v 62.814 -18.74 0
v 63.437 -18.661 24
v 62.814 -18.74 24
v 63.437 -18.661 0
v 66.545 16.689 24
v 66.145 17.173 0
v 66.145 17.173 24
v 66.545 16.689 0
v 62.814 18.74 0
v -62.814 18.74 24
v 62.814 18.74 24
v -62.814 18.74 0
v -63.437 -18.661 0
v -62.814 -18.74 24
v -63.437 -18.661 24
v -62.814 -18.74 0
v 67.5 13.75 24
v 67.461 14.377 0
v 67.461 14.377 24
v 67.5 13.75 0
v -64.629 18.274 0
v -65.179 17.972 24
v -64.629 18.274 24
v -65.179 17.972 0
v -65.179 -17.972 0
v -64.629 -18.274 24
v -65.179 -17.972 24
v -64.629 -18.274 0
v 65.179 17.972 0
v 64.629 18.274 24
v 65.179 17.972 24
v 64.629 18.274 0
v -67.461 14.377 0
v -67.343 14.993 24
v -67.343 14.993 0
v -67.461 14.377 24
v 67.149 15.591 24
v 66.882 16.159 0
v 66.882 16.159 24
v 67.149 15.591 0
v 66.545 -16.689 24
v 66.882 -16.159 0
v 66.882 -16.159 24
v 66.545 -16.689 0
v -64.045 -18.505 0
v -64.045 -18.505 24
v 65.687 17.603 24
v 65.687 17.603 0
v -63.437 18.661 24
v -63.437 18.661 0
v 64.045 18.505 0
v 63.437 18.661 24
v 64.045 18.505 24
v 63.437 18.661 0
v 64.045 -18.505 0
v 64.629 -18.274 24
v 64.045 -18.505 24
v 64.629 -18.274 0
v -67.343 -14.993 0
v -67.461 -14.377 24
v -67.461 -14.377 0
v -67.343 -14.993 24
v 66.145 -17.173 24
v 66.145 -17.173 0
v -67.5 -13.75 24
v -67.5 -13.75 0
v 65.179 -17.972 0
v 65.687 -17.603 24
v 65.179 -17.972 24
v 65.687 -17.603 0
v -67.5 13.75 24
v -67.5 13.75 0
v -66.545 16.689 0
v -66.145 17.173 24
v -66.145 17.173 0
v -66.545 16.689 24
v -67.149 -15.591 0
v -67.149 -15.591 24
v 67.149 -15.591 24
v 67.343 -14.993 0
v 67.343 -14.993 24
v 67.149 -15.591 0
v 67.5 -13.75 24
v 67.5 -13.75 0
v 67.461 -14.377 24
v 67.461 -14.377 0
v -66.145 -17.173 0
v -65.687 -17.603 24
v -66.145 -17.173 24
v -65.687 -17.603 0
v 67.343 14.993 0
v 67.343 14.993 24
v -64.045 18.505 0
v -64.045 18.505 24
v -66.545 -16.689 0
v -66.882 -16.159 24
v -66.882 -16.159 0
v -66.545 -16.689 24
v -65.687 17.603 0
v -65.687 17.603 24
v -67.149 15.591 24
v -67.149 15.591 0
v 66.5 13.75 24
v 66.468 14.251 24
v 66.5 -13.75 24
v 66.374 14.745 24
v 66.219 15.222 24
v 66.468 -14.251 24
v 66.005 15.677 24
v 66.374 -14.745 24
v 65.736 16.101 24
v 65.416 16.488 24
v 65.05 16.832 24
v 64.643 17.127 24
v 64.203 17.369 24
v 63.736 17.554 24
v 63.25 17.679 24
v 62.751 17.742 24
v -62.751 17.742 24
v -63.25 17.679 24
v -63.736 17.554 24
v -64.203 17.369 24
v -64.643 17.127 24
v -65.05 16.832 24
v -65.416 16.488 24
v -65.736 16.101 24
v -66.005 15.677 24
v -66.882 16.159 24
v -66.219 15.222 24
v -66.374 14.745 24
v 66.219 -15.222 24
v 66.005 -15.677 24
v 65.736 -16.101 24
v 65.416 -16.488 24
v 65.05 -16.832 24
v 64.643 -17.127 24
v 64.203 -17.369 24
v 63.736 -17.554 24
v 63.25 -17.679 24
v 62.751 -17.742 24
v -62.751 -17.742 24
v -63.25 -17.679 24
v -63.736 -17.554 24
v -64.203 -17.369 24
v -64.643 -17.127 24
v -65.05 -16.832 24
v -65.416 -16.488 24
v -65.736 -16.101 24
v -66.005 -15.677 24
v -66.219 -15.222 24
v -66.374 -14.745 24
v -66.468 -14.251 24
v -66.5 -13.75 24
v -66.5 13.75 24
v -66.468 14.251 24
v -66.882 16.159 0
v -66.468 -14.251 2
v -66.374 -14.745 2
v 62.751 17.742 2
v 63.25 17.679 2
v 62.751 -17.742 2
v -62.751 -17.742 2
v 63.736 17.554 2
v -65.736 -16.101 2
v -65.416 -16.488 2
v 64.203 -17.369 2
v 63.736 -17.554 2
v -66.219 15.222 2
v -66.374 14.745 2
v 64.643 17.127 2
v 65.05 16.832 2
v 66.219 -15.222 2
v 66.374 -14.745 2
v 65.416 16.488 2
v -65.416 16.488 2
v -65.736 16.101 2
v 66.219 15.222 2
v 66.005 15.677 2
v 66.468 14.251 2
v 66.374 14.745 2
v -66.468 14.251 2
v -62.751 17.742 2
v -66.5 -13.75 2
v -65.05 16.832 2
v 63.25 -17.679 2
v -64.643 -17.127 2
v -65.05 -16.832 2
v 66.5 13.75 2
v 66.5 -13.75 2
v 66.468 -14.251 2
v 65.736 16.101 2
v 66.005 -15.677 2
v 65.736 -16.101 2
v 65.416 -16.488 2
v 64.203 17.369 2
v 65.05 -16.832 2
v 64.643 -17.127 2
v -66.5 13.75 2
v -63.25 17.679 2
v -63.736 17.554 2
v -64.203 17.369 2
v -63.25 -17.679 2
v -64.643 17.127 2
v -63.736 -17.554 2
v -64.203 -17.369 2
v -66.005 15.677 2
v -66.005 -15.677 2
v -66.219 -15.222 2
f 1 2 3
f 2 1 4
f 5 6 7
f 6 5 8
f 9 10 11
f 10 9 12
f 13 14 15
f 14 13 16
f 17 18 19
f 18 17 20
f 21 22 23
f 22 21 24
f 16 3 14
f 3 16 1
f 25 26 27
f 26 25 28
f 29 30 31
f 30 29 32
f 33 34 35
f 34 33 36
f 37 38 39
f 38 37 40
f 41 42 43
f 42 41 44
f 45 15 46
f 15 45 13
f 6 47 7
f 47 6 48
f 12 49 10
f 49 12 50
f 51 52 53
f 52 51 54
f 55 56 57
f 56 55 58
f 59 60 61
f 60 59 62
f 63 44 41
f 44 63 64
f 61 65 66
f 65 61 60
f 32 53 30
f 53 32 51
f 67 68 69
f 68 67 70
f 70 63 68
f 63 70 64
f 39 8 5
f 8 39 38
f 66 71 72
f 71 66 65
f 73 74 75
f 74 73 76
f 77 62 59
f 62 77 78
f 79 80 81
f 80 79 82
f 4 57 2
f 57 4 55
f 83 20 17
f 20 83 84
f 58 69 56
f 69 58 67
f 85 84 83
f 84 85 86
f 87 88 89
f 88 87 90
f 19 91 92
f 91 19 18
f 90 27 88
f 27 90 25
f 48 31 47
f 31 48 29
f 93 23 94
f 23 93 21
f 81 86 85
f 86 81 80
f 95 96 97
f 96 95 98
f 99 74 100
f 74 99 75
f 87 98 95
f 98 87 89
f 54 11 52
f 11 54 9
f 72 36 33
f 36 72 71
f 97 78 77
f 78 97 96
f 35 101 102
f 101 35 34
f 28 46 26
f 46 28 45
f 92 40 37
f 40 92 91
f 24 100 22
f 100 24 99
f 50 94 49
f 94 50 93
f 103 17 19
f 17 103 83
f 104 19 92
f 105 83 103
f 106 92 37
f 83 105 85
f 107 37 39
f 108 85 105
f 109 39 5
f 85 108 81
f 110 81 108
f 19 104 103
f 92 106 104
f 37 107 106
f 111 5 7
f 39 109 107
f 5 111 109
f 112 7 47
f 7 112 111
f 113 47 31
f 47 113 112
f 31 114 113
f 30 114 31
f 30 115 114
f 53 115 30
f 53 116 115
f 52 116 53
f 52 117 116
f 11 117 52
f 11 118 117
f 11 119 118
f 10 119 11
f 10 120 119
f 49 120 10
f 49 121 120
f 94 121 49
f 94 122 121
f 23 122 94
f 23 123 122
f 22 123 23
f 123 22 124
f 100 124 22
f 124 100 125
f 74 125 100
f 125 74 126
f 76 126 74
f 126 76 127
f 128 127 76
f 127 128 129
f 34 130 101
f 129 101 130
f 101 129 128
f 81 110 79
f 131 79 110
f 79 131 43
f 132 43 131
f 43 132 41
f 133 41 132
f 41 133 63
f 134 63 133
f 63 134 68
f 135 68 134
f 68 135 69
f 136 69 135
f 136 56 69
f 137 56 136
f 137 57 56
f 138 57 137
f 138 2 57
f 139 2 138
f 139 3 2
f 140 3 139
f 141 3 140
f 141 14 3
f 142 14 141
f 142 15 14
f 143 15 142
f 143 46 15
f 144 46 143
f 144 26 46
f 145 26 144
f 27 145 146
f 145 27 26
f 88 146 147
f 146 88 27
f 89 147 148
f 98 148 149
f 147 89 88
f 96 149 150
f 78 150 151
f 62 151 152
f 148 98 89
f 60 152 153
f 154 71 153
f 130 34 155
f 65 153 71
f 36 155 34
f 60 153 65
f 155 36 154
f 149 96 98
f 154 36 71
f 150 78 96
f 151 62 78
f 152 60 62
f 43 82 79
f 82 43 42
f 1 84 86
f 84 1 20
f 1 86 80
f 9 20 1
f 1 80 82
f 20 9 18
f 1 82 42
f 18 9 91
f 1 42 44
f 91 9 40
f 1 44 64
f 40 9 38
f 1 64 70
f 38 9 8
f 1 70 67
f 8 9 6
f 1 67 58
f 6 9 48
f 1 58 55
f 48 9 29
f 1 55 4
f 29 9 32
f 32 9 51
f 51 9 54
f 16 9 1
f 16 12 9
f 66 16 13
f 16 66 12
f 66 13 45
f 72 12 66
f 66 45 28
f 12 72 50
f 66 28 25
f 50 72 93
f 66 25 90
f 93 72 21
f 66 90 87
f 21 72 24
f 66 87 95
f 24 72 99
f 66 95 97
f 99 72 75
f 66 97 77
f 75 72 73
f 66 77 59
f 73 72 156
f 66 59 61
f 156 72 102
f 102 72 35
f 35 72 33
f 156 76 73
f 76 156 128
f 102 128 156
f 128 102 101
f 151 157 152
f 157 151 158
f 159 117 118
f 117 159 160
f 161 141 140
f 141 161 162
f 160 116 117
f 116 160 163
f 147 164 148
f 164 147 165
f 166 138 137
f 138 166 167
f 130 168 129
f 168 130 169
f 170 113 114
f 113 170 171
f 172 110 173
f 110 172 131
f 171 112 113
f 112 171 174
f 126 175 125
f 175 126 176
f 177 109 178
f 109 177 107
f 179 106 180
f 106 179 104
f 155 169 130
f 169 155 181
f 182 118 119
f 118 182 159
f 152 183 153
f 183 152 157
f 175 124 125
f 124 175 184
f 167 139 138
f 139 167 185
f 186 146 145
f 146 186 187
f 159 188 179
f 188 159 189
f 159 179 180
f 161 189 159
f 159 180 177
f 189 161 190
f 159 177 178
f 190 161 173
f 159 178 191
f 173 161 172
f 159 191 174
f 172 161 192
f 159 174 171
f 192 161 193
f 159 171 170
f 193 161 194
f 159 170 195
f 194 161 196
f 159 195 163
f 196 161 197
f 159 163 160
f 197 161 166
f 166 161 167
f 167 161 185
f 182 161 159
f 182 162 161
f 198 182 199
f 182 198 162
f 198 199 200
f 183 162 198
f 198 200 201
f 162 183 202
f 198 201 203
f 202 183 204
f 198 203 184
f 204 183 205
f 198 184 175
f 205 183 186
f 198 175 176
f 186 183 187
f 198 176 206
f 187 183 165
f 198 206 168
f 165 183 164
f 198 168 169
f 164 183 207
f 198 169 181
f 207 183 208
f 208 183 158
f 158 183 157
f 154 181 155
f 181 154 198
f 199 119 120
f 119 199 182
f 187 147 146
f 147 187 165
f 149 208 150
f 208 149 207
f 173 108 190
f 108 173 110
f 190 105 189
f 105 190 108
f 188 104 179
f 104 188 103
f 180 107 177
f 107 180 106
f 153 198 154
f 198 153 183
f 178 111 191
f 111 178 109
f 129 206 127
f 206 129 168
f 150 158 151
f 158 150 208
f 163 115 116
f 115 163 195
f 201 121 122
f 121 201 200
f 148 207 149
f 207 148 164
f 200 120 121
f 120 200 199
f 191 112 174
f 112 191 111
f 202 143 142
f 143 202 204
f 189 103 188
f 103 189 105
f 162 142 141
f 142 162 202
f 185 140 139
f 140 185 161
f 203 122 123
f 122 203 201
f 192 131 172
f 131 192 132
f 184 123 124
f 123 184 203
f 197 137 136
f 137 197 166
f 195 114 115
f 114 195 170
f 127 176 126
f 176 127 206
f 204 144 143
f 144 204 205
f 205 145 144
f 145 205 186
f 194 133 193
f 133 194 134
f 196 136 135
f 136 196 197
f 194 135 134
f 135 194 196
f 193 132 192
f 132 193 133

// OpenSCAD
$fn = 50;


difference() {
	union() {
		hull() {
			translate(v = [-62.5000000000, 13.7500000000, 0]) {
				cylinder(h = 24, r = 5);
			}
			translate(v = [62.5000000000, 13.7500000000, 0]) {
				cylinder(h = 24, r = 5);
			}
			translate(v = [-62.5000000000, -13.7500000000, 0]) {
				cylinder(h = 24, r = 5);
			}
			translate(v = [62.5000000000, -13.7500000000, 0]) {
				cylinder(h = 24, r = 5);
			}
		}
	}
	union() {
		translate(v = [0, 0, 2]) {
			hull() {
				translate(v = [-62.5000000000, 13.7500000000, 0]) {
					cylinder(h = 22, r = 4);
				}
				translate(v = [62.5000000000, 13.7500000000, 0]) {
					cylinder(h = 22, r = 4);
				}
				translate(v = [-62.5000000000, -13.7500000000, 0]) {
					cylinder(h = 22, r = 4);
				}
				translate(v = [62.5000000000, -13.7500000000, 0]) {
					cylinder(h = 22, r = 4);
				}
			}
		}
	}
}
